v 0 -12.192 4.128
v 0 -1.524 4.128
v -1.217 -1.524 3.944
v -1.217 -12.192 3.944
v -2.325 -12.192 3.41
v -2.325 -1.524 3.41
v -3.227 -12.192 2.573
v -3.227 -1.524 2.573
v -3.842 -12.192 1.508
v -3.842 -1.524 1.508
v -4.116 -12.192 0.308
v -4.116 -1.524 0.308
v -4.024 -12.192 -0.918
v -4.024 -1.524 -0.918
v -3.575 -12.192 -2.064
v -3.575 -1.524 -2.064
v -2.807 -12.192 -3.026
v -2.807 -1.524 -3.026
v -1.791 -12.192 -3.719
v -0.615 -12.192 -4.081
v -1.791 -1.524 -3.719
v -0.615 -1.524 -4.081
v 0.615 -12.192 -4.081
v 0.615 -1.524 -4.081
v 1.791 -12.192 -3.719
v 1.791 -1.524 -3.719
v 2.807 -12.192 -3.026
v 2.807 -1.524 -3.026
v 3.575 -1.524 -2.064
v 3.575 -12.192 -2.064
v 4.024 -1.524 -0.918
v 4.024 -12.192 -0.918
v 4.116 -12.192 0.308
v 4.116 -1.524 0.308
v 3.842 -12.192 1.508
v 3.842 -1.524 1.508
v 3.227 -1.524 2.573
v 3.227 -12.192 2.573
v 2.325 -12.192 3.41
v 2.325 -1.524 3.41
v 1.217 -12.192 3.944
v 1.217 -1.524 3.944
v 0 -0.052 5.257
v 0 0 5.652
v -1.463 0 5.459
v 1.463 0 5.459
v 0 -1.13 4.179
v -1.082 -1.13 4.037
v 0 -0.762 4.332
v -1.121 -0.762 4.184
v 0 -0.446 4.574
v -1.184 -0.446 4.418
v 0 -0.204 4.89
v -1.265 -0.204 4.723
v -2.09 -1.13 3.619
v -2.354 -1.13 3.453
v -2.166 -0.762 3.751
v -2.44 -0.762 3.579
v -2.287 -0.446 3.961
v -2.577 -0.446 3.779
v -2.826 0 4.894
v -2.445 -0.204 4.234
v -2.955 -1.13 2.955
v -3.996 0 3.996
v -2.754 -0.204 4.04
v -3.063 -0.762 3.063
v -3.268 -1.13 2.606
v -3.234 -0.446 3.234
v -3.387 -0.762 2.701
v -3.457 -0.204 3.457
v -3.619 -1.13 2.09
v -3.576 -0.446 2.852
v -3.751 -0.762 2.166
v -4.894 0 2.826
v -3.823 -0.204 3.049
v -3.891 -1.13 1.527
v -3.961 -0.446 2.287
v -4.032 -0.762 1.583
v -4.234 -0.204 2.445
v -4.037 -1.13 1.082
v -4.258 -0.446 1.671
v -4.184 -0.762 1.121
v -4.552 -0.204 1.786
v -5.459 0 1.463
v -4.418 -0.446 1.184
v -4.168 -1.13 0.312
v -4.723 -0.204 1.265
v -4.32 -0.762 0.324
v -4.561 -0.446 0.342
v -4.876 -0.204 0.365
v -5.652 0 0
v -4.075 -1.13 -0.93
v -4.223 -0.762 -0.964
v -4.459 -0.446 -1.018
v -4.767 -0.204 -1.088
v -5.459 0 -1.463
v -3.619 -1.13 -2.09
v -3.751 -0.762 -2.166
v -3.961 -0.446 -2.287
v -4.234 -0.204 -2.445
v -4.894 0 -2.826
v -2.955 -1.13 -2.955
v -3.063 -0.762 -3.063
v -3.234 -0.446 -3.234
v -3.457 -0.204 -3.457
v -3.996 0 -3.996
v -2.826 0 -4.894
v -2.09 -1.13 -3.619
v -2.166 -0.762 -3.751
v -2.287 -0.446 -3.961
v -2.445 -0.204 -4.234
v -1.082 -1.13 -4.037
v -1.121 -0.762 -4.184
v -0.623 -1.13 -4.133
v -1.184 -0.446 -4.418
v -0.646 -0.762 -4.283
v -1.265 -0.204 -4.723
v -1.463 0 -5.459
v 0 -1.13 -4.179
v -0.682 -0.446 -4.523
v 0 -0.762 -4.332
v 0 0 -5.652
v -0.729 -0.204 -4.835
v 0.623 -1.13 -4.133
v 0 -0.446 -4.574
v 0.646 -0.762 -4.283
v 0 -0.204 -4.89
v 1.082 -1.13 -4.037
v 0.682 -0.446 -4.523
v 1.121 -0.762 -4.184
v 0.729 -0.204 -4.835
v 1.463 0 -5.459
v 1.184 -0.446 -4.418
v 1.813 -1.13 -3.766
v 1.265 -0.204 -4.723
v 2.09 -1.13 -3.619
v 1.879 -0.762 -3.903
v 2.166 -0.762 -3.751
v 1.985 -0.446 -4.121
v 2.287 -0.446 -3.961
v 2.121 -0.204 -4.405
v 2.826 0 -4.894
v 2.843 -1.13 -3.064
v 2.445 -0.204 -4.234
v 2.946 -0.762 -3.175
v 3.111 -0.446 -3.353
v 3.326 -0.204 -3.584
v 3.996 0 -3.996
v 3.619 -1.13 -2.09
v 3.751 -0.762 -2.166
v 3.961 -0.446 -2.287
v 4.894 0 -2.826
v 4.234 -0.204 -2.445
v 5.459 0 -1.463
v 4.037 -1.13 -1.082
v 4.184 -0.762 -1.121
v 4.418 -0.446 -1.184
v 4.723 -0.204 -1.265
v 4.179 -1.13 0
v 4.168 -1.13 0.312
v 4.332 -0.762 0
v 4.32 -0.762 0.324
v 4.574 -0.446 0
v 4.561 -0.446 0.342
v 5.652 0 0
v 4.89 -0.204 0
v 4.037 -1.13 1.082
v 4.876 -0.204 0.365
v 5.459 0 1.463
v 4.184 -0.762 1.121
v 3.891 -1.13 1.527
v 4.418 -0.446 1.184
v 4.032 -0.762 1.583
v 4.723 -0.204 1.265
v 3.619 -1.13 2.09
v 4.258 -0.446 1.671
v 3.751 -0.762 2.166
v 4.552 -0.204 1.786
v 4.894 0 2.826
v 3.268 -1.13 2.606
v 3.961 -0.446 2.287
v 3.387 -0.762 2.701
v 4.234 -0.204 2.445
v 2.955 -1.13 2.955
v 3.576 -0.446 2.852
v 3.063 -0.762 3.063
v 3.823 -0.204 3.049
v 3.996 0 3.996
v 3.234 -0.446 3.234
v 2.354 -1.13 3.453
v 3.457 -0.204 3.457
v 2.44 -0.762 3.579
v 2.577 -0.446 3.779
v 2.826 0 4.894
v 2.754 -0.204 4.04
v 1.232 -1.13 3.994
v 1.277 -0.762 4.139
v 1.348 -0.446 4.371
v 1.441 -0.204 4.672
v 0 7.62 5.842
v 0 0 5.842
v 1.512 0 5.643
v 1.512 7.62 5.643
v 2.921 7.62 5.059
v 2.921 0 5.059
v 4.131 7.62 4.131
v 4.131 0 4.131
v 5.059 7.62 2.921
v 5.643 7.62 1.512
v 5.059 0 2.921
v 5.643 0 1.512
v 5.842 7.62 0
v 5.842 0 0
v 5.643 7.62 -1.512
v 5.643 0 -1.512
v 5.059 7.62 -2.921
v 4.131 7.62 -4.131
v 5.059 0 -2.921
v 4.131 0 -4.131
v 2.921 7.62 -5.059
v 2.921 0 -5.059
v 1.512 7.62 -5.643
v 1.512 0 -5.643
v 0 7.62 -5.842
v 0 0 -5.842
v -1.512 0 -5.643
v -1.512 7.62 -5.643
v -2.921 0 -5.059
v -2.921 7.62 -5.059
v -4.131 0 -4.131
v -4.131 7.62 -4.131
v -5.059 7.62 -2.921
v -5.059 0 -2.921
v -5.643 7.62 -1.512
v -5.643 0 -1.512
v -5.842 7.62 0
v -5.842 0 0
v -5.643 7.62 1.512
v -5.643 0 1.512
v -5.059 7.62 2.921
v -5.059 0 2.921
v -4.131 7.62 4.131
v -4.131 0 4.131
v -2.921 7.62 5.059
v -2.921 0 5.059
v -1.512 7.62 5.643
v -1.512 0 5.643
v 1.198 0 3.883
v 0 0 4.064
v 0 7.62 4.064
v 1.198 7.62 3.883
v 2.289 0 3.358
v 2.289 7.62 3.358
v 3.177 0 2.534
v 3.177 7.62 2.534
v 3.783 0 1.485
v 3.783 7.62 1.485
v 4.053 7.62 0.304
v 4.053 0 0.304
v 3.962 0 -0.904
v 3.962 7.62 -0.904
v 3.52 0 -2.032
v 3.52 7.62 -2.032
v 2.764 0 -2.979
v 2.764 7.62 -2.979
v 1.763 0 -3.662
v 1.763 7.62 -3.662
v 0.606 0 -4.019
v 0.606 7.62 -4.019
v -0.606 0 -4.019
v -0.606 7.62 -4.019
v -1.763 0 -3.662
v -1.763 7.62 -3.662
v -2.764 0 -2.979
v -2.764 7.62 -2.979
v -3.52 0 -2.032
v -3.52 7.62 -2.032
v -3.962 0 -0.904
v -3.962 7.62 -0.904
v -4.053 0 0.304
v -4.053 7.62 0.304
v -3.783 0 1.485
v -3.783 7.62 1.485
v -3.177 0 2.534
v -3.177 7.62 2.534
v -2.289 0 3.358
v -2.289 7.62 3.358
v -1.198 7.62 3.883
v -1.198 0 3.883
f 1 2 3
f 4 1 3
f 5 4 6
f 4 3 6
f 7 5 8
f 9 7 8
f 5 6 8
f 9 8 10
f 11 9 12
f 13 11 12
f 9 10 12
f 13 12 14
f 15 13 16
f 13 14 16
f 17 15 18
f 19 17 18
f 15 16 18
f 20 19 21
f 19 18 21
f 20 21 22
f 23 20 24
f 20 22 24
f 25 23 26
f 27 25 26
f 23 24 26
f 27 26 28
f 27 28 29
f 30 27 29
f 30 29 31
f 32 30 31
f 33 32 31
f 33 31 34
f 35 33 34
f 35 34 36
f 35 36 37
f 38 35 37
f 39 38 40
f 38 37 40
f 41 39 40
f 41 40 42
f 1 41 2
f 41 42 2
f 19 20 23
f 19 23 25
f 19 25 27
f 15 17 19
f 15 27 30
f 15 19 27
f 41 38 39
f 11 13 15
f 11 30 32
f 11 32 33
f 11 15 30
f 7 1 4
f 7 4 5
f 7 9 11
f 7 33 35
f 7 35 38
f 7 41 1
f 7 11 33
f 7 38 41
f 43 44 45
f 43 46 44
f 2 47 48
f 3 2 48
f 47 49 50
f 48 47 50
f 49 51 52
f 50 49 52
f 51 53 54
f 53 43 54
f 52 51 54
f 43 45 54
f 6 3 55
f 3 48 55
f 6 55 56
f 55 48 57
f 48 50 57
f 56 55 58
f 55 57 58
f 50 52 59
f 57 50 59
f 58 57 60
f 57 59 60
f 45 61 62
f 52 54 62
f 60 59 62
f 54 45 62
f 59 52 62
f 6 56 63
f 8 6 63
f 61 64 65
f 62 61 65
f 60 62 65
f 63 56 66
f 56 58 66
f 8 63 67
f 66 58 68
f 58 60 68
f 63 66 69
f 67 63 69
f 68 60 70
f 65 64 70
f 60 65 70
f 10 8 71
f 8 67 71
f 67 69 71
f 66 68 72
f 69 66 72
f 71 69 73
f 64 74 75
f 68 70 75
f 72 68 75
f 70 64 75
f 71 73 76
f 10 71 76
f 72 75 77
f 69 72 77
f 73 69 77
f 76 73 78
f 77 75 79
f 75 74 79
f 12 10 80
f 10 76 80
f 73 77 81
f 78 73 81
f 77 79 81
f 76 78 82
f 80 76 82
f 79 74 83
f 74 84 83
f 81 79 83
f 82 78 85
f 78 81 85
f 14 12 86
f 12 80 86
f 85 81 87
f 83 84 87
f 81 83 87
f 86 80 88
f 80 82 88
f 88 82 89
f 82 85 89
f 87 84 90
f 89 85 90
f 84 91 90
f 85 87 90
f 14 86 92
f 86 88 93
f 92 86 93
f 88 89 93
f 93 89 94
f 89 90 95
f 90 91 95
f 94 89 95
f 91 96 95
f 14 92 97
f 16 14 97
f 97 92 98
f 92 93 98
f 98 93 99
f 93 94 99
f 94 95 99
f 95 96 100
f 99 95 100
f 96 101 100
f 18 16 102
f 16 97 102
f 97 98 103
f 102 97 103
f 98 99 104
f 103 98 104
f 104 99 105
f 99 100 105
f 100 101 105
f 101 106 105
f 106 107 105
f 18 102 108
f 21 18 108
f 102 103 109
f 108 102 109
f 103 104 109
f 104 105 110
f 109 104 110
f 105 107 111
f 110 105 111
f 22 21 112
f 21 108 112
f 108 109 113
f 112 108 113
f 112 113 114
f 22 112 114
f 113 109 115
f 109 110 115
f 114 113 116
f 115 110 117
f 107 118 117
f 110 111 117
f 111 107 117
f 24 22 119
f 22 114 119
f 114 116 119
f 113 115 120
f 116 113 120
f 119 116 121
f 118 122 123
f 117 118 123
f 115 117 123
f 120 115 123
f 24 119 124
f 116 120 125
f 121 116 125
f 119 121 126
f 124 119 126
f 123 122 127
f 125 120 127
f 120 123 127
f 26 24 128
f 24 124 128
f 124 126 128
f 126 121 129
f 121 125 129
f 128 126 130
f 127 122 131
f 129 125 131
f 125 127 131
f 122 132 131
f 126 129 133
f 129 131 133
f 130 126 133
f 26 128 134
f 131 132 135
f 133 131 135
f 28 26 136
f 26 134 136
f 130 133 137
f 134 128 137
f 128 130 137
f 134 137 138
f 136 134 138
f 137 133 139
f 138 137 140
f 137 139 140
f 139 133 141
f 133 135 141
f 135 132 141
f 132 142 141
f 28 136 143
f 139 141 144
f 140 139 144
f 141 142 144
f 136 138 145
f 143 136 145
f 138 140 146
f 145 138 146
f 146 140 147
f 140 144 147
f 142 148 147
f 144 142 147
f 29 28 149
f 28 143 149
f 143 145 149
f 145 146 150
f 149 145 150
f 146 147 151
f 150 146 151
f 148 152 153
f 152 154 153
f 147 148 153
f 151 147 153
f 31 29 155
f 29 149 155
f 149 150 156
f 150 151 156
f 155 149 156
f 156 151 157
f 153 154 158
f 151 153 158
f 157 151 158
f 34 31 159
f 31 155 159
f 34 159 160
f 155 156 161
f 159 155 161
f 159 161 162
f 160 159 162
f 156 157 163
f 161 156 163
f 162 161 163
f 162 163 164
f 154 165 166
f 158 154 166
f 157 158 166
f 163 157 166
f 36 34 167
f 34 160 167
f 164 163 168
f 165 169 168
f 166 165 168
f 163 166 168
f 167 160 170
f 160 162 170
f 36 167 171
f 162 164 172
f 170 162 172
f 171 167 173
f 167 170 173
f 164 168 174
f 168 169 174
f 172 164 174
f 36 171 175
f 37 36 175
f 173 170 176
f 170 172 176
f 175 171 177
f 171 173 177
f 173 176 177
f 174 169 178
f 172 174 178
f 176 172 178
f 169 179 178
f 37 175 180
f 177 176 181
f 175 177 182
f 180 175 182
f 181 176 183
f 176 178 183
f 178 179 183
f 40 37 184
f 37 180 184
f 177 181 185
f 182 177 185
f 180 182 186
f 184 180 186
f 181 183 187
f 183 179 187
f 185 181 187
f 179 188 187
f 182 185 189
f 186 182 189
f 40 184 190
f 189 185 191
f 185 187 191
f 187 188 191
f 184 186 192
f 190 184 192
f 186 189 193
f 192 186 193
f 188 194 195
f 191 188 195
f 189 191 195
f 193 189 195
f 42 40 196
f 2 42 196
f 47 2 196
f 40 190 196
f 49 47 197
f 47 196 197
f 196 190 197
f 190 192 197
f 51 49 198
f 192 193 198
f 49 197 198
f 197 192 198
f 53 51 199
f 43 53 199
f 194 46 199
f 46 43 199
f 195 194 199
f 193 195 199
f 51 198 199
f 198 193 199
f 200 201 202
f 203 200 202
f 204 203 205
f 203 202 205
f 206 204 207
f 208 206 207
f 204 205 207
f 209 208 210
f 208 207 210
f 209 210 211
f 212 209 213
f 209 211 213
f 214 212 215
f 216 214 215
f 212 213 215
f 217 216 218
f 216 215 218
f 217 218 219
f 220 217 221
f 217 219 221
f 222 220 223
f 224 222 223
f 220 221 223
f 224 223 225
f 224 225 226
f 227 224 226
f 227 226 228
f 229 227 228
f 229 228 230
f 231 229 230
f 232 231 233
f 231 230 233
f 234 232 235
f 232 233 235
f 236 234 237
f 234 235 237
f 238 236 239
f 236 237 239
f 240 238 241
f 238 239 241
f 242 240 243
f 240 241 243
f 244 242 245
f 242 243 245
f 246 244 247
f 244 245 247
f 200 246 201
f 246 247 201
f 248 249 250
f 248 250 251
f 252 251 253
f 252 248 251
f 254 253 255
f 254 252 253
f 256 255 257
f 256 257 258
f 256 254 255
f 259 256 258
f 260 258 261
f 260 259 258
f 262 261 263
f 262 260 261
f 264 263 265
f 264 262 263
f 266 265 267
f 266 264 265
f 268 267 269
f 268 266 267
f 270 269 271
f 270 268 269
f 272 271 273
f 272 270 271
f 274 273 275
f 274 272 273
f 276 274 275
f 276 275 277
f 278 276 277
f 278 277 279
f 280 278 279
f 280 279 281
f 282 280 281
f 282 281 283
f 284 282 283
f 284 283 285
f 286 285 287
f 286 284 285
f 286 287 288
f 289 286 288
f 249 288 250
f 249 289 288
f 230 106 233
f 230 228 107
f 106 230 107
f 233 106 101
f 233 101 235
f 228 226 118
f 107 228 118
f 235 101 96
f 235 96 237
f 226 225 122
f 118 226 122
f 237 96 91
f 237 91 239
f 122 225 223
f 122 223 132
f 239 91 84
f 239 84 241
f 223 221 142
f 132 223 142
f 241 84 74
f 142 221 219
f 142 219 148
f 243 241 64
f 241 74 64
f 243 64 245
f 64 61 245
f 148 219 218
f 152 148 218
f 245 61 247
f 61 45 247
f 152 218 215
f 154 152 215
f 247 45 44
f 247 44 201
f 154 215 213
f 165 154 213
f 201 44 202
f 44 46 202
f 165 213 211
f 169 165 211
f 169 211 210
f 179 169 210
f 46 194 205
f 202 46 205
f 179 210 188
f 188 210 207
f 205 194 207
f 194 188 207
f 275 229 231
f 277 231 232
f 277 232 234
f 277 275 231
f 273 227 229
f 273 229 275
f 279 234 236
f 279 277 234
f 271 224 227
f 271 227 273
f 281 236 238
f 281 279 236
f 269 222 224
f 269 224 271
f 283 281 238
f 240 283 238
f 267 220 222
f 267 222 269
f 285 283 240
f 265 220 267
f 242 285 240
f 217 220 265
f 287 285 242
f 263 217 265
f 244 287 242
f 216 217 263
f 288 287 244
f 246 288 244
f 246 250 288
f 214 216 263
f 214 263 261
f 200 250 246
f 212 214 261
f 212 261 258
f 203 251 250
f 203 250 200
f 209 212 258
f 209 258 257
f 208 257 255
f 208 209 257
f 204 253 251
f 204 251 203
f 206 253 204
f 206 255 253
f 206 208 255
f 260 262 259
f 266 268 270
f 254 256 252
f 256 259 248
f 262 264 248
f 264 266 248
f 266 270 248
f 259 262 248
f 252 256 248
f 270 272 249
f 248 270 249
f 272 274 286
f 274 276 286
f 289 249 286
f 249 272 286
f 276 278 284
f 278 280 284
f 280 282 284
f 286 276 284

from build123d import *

# Parameters (mm, degrees)
SKETCH1_R           = 5.842
SKETCH1_R_2         = 4.064
BOSS_EXTRUDE1_DEPTH = 7.62
SKETCH3_R           = 4.1275
BOSS_EXTRUDE2_DEPTH = 12.192
FILLET2_R           = 1.524


with BuildPart() as part:
    # Sketch1 → Boss-Extrude1 (new body)
    with BuildSketch(Plane(origin=(0, 0, 0), x_dir=(1, 0, 0), z_dir=(0, 1, 0))):
        with Locations(Location((0, 0, 0), (0, 0, 270))):  # turned: the seam where the file's is
            Circle(SKETCH1_R)
        with Locations(Location((0, 0, 0), (0, 0, 270))):  # turned: the seam where the file's is
            Circle(SKETCH1_R_2, mode=Mode.SUBTRACT)
    extrude(amount=BOSS_EXTRUDE1_DEPTH)

    # Sketch3 → Boss-Extrude2 (add)
    with BuildSketch(Plane.XZ):
        with Locations(Location((0, 0, 0), (0, 0, 90))):  # turned: the seam where the file's is
            Circle(SKETCH3_R)
    extrude(amount=BOSS_EXTRUDE2_DEPTH)

    # Fillet2
    fillet2_edges = [part.edges().sort_by_distance(p)[0] for p in [
        (0, 0, -4.1275),
    ]]
    fillet(fillet2_edges, radius=FILLET2_R)


solid = part.part
